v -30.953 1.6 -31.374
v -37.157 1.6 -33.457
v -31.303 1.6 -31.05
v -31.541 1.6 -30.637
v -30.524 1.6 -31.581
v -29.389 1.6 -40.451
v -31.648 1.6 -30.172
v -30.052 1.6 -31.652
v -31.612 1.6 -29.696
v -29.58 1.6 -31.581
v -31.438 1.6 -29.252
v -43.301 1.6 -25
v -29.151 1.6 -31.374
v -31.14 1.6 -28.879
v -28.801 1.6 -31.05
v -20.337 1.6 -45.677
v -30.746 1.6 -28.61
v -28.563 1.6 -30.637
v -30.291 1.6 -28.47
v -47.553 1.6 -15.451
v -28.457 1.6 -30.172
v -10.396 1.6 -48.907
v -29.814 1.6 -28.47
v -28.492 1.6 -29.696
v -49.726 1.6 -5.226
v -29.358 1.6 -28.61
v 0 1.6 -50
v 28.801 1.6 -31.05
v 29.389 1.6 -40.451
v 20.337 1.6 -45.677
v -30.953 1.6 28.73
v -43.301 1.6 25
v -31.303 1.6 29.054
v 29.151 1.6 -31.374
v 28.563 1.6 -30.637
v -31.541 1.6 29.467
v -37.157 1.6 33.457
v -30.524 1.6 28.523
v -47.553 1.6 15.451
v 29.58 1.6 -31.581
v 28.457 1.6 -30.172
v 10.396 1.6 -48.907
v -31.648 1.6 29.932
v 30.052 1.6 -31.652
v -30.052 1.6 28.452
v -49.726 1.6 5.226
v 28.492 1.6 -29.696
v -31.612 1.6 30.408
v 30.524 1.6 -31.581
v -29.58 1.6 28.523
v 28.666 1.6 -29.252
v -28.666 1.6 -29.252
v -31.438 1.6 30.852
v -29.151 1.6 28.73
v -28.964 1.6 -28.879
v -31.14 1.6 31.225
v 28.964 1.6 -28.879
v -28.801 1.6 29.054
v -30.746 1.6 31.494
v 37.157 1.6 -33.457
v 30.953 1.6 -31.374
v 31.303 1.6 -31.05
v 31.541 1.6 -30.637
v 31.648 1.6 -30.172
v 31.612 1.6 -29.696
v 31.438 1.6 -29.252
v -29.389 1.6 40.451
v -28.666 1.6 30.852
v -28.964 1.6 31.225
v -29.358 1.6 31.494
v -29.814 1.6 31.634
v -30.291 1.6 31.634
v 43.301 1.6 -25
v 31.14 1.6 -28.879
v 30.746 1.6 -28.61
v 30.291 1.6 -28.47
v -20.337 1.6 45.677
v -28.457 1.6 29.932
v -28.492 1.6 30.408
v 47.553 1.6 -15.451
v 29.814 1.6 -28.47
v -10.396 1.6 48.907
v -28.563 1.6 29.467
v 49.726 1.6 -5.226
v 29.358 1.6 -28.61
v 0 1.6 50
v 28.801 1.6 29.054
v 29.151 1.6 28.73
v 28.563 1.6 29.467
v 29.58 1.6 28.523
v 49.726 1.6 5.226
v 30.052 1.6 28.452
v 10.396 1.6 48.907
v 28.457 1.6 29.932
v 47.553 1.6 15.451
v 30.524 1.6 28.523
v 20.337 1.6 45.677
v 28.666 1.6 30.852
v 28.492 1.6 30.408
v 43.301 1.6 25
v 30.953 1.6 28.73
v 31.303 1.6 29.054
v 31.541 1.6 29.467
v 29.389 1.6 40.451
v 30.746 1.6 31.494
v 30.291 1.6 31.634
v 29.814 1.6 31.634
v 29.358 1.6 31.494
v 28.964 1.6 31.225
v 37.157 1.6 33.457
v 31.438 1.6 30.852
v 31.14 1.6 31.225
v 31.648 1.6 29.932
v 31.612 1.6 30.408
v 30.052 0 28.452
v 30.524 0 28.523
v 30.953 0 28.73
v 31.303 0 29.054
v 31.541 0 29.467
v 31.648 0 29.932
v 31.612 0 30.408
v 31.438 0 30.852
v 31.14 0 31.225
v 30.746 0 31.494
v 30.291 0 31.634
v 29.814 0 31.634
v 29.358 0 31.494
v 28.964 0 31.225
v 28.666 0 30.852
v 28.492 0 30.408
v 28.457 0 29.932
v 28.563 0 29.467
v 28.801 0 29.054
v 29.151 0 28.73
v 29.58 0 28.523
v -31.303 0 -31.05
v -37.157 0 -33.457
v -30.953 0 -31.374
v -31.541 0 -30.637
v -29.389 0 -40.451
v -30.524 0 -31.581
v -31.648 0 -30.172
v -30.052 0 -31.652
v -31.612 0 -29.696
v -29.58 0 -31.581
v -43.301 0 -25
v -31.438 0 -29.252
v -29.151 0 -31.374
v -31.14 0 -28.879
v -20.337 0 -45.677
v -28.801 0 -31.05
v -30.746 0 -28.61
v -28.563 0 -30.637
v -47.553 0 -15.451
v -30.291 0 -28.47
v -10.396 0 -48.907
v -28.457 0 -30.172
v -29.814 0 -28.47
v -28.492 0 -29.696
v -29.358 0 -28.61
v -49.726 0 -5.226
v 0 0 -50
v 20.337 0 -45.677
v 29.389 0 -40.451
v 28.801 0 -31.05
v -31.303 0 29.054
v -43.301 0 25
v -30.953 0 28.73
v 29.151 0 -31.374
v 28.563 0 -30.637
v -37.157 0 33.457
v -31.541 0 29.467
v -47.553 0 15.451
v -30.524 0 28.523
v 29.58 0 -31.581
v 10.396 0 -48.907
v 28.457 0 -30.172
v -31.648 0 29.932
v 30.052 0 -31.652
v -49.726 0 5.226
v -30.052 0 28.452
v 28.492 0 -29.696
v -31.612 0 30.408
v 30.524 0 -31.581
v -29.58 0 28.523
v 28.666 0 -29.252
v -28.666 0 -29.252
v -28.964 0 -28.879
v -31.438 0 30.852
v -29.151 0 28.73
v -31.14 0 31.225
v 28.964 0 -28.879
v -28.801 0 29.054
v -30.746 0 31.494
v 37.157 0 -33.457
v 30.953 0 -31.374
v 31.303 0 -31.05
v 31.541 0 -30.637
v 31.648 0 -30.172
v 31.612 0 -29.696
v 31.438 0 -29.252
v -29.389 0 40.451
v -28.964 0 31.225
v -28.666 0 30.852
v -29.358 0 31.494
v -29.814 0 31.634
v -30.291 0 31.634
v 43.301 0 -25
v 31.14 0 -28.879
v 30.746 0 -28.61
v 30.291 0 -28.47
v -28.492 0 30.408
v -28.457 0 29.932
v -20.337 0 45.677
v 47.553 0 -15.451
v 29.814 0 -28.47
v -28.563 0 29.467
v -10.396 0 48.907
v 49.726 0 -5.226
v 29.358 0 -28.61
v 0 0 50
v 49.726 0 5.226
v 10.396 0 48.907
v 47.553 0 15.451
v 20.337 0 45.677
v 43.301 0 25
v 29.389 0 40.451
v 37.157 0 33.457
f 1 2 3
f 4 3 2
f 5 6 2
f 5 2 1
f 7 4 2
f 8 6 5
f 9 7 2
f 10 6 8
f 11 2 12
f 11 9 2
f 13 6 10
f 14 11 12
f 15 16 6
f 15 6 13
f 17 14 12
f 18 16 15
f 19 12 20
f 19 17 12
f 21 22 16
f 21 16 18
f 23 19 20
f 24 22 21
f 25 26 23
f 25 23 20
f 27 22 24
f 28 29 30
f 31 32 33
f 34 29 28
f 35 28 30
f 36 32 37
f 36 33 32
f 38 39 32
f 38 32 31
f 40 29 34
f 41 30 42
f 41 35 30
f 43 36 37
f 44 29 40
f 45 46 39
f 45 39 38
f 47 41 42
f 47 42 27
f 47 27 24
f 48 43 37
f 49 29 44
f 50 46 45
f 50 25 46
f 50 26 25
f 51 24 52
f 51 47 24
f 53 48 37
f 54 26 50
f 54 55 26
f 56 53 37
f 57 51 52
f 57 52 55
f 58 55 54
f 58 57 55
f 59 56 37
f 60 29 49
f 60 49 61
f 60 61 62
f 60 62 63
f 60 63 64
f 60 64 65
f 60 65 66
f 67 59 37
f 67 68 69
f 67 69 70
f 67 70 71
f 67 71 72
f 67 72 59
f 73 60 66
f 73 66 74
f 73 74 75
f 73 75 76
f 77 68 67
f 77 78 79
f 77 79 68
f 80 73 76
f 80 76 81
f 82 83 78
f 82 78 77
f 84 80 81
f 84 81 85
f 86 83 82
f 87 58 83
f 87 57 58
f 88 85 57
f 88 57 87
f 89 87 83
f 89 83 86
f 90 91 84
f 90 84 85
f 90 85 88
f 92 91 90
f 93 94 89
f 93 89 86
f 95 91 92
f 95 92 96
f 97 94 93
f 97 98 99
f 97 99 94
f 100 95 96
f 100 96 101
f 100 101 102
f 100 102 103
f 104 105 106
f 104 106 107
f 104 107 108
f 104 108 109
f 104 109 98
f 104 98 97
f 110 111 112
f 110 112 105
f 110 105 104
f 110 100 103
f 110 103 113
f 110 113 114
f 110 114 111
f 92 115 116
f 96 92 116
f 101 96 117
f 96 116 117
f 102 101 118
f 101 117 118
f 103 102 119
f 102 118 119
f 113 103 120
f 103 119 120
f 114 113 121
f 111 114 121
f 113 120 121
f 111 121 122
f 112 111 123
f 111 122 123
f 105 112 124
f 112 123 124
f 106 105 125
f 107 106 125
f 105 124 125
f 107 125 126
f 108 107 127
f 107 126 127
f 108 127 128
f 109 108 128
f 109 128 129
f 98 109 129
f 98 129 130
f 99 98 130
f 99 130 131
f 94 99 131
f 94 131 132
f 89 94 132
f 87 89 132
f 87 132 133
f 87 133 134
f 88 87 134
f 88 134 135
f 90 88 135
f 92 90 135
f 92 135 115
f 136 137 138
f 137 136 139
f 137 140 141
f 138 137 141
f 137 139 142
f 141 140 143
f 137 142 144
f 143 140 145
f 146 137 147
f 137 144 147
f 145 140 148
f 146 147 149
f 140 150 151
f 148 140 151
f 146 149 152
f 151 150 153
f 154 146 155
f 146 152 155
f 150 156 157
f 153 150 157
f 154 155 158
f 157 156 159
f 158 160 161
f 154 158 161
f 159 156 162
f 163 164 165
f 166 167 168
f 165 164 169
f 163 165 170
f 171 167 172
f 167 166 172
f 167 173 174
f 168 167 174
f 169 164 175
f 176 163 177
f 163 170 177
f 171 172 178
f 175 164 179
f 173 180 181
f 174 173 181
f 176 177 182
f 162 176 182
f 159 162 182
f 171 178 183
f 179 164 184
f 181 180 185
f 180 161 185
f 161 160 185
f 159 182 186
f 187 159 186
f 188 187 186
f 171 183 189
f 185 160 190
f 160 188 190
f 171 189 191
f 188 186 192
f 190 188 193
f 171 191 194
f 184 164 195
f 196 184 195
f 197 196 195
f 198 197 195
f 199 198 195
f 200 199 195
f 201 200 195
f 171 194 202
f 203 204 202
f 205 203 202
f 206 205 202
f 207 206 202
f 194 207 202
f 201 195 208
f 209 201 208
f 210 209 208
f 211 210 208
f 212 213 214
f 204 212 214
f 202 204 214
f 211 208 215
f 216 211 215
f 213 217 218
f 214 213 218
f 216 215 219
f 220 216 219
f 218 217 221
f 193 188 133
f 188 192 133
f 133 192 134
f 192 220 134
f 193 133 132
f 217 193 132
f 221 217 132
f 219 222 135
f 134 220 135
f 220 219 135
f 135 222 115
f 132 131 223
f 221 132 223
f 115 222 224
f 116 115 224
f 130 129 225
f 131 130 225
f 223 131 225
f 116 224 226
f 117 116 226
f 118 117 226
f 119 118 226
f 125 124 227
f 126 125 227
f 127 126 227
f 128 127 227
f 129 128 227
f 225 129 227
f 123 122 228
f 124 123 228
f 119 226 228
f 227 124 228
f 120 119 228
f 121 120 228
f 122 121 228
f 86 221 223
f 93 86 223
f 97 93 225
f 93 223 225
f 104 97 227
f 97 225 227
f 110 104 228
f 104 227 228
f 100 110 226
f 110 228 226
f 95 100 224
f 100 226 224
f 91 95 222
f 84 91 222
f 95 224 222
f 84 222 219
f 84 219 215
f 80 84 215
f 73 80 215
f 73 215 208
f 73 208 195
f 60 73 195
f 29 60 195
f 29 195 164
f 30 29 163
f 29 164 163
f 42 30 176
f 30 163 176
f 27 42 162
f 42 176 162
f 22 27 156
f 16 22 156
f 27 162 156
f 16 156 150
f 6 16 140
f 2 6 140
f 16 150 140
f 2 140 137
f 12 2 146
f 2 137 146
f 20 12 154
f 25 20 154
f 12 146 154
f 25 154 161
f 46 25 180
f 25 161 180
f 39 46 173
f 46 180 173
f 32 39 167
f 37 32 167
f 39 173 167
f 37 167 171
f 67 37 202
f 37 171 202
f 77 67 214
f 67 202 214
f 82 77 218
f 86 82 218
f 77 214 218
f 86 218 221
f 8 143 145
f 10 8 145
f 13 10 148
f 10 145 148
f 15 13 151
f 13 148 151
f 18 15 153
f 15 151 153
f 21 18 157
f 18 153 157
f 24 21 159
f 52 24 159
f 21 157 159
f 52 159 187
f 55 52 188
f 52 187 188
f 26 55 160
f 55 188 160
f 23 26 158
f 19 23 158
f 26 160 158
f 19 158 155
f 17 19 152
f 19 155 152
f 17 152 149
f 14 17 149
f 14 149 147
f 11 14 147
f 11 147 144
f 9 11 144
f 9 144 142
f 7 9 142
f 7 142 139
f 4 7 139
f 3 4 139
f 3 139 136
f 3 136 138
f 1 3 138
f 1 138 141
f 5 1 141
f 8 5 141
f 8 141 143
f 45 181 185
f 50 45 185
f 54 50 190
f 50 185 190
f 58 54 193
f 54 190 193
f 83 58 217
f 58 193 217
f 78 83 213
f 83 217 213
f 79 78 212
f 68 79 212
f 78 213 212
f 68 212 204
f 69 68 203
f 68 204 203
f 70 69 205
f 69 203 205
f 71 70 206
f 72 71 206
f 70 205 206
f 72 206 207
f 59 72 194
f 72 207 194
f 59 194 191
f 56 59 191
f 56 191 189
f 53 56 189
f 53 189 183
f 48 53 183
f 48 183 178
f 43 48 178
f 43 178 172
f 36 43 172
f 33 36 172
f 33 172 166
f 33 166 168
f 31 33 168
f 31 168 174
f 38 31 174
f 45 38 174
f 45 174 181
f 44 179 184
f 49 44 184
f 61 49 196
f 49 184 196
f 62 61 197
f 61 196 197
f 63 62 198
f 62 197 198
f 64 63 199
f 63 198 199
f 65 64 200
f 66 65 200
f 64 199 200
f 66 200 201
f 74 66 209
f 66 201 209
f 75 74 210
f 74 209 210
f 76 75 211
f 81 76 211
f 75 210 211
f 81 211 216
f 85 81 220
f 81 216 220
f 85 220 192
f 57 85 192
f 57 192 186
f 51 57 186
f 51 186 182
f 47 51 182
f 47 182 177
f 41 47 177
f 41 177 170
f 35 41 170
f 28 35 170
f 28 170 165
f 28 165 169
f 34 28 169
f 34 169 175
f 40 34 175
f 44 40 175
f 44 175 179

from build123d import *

# Parameters (mm, degrees)
ESBO_O1_R                = 50
RESSALTO_EXTRUS_O1_DEPTH = 1.6
ESBO_O2_R                = 1.6
CORTE_EXTRUS_O1_DEPTH    = 71.728777736


with BuildPart() as part:
    # Esboço1 → Ressalto-extrusão1 (new body)
    with BuildSketch(Plane(origin=(0, 0, 0), x_dir=(1, 0, 0), z_dir=(0, 1, 0))):
        with Locations(Location((0, 0, 0), (0, 0, 270))):
            Circle(ESBO_O1_R)
    extrude(amount=RESSALTO_EXTRUS_O1_DEPTH)

    # Esboço2 → Corte-extrusão1 (cut, through all)
    with BuildSketch(Plane.XZ):
        with Locations(Location((-30.0520382, -30.0520382, 0), (0, 0, 270))):
            Circle(ESBO_O2_R)
        with Locations(Location((-30.0520382, 30.0520382, 0), (0, 0, 270))):
            Circle(ESBO_O2_R)
        with Locations(Location((30.0520382, 30.0520382, 0), (0, 0, 270))):
            Circle(ESBO_O2_R)
        with Locations(Location((30.0520382, -30.0520382, 0), (0, 0, 270))):
            Circle(ESBO_O2_R)
    extrude(amount=-CORTE_EXTRUS_O1_DEPTH, mode=Mode.SUBTRACT)


solid = part.part
